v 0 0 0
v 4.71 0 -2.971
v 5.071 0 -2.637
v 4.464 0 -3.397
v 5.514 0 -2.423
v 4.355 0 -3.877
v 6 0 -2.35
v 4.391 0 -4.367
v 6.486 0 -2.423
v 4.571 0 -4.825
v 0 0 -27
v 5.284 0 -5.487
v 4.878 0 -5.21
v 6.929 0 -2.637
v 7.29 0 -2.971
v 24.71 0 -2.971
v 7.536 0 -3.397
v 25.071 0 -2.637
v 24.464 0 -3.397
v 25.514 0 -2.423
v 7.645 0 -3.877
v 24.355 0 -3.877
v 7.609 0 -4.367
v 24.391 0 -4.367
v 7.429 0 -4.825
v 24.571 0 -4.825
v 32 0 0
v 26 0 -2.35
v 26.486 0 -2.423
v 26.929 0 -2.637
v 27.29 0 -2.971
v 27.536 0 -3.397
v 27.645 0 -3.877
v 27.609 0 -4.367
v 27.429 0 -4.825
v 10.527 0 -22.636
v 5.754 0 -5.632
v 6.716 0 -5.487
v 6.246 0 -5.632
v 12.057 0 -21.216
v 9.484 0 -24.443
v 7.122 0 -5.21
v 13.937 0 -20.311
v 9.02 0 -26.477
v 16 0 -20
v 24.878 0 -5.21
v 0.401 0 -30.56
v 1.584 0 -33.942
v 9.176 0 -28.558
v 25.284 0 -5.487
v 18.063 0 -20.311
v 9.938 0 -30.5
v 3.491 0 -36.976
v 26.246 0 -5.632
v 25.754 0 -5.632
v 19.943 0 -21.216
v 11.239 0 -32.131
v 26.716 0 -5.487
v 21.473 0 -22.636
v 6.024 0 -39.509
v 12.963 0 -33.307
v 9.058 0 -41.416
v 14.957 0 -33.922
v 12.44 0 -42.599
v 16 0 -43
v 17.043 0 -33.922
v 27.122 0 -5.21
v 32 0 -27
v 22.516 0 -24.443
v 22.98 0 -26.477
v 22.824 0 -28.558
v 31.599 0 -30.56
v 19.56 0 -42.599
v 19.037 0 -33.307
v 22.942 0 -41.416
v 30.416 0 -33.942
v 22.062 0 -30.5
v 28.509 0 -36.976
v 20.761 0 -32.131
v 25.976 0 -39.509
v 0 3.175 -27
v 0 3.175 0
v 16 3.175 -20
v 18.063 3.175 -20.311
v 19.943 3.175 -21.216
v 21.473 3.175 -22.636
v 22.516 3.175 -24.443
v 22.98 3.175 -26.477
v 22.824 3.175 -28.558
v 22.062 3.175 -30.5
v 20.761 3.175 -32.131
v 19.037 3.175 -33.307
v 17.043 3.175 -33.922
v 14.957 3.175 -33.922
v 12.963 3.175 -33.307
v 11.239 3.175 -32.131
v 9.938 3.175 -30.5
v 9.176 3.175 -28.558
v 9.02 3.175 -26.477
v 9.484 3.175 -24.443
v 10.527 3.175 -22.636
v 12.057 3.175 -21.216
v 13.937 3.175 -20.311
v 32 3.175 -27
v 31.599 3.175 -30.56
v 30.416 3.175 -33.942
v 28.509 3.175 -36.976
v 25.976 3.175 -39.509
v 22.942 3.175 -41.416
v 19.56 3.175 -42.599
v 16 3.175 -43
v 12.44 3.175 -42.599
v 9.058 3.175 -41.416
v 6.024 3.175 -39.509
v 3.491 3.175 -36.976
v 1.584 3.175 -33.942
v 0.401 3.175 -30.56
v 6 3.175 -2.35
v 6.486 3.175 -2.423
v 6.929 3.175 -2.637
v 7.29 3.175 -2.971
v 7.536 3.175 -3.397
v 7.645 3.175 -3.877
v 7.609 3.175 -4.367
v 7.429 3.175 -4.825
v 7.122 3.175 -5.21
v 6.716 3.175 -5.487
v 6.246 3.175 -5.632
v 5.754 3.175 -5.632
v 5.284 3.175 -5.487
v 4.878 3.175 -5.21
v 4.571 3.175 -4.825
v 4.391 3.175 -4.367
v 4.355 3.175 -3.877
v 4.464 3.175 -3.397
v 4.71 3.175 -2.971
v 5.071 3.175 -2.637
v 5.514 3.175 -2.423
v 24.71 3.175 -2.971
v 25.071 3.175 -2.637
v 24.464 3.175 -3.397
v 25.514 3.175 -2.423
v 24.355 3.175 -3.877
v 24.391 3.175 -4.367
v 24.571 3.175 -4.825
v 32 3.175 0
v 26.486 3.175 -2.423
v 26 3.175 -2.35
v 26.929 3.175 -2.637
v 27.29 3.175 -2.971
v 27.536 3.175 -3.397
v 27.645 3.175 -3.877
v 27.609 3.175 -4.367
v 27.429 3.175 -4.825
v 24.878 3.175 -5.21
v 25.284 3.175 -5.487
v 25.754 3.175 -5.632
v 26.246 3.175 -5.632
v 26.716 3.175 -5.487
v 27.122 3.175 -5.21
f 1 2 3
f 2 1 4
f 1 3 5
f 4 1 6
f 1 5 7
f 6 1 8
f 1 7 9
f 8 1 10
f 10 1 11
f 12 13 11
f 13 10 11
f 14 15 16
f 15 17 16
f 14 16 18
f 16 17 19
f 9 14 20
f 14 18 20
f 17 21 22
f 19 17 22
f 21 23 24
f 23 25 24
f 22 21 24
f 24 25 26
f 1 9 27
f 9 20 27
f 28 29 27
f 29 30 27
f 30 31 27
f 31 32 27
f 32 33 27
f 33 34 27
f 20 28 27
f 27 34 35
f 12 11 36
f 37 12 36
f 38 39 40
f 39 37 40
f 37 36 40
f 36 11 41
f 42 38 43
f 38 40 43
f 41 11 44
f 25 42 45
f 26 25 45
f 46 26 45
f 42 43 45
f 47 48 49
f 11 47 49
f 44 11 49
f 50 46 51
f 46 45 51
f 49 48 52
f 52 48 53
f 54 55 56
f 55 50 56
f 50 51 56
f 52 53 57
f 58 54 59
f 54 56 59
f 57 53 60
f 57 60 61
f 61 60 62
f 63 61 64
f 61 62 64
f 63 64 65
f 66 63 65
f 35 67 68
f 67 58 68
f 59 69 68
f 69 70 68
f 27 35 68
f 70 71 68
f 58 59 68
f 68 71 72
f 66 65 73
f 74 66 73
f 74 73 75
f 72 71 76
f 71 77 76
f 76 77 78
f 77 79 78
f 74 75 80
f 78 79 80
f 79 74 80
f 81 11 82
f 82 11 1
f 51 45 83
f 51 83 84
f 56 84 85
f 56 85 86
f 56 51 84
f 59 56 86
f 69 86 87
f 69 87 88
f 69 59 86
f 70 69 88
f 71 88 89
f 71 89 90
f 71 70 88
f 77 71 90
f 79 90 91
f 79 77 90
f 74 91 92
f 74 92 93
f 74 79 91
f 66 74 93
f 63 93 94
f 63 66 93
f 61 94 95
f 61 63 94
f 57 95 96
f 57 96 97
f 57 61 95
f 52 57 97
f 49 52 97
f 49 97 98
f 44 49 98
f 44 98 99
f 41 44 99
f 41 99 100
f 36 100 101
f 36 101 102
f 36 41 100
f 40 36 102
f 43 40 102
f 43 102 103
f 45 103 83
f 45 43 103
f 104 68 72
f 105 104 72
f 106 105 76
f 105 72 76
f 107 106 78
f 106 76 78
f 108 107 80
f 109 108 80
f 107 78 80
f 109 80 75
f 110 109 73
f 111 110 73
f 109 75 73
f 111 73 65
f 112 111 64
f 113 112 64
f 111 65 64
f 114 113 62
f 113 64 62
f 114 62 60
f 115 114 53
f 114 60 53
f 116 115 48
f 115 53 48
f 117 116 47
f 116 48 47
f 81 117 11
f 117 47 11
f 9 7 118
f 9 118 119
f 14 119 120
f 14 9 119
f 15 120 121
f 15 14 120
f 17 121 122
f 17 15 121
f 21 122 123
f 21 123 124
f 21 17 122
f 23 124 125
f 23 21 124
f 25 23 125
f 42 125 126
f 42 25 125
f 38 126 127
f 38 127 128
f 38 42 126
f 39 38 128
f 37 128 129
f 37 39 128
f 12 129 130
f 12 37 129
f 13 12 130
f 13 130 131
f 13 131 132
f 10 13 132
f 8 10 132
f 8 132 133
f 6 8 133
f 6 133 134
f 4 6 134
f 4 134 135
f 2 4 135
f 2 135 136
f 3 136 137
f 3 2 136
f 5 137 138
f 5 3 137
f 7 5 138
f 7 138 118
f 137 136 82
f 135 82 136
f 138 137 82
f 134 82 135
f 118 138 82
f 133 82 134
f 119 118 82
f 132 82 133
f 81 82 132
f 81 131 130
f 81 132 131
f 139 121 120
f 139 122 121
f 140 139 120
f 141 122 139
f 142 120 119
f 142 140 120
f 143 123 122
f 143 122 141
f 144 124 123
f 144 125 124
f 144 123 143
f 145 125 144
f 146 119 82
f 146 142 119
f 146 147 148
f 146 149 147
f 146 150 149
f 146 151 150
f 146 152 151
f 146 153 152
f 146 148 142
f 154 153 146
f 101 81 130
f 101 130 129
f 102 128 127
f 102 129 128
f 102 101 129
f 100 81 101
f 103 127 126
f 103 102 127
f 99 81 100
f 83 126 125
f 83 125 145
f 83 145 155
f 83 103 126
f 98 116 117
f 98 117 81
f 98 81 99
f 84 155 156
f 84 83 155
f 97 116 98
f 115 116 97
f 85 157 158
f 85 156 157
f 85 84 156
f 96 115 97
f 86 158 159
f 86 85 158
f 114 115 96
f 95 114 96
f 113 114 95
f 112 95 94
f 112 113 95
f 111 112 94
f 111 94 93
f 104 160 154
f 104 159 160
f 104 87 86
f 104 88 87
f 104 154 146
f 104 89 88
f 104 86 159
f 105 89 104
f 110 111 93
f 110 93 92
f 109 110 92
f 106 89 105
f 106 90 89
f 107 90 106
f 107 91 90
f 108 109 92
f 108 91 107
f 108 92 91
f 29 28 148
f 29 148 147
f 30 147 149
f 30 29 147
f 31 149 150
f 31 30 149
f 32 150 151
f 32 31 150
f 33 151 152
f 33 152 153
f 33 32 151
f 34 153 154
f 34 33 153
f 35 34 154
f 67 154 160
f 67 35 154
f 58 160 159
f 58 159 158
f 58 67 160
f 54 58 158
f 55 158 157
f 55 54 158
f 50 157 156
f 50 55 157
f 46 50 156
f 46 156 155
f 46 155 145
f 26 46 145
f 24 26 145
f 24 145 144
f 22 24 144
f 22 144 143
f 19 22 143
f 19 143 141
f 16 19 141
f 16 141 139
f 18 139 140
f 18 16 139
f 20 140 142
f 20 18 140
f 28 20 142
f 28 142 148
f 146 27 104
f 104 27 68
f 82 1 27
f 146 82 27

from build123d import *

# Parameters (mm, degrees)
SKETCH1_R           = 1.65
SKETCH1_R_2         = 7
BOSS_EXTRUDE1_DEPTH = 3.175


with BuildPart() as part:
    # Sketch1 → Boss-Extrude1 (new body)
    with BuildSketch(Plane(origin=(0, 0, 0), x_dir=(1, 0, 0), z_dir=(0, 1, 0))):
        with BuildLine():
            Line((0, 0), (32, 0))
            Line((32, 0), (32, 27))
            ThreePointArc((32, 27), (16, 43), (0, 27))
            Line((0, 27), (0, 0))
        make_face()
        with Locations(Location((6, 4, 0), (0, 0, 270))):
            Circle(SKETCH1_R, mode=Mode.SUBTRACT)
        with Locations(Location((26, 4, 0), (0, 0, 270))):
            Circle(SKETCH1_R, mode=Mode.SUBTRACT)
        with Locations(Location((16, 27, 0), (0, 0, 270))):
            Circle(SKETCH1_R_2, mode=Mode.SUBTRACT)
    extrude(amount=BOSS_EXTRUDE1_DEPTH)


solid = part.part
